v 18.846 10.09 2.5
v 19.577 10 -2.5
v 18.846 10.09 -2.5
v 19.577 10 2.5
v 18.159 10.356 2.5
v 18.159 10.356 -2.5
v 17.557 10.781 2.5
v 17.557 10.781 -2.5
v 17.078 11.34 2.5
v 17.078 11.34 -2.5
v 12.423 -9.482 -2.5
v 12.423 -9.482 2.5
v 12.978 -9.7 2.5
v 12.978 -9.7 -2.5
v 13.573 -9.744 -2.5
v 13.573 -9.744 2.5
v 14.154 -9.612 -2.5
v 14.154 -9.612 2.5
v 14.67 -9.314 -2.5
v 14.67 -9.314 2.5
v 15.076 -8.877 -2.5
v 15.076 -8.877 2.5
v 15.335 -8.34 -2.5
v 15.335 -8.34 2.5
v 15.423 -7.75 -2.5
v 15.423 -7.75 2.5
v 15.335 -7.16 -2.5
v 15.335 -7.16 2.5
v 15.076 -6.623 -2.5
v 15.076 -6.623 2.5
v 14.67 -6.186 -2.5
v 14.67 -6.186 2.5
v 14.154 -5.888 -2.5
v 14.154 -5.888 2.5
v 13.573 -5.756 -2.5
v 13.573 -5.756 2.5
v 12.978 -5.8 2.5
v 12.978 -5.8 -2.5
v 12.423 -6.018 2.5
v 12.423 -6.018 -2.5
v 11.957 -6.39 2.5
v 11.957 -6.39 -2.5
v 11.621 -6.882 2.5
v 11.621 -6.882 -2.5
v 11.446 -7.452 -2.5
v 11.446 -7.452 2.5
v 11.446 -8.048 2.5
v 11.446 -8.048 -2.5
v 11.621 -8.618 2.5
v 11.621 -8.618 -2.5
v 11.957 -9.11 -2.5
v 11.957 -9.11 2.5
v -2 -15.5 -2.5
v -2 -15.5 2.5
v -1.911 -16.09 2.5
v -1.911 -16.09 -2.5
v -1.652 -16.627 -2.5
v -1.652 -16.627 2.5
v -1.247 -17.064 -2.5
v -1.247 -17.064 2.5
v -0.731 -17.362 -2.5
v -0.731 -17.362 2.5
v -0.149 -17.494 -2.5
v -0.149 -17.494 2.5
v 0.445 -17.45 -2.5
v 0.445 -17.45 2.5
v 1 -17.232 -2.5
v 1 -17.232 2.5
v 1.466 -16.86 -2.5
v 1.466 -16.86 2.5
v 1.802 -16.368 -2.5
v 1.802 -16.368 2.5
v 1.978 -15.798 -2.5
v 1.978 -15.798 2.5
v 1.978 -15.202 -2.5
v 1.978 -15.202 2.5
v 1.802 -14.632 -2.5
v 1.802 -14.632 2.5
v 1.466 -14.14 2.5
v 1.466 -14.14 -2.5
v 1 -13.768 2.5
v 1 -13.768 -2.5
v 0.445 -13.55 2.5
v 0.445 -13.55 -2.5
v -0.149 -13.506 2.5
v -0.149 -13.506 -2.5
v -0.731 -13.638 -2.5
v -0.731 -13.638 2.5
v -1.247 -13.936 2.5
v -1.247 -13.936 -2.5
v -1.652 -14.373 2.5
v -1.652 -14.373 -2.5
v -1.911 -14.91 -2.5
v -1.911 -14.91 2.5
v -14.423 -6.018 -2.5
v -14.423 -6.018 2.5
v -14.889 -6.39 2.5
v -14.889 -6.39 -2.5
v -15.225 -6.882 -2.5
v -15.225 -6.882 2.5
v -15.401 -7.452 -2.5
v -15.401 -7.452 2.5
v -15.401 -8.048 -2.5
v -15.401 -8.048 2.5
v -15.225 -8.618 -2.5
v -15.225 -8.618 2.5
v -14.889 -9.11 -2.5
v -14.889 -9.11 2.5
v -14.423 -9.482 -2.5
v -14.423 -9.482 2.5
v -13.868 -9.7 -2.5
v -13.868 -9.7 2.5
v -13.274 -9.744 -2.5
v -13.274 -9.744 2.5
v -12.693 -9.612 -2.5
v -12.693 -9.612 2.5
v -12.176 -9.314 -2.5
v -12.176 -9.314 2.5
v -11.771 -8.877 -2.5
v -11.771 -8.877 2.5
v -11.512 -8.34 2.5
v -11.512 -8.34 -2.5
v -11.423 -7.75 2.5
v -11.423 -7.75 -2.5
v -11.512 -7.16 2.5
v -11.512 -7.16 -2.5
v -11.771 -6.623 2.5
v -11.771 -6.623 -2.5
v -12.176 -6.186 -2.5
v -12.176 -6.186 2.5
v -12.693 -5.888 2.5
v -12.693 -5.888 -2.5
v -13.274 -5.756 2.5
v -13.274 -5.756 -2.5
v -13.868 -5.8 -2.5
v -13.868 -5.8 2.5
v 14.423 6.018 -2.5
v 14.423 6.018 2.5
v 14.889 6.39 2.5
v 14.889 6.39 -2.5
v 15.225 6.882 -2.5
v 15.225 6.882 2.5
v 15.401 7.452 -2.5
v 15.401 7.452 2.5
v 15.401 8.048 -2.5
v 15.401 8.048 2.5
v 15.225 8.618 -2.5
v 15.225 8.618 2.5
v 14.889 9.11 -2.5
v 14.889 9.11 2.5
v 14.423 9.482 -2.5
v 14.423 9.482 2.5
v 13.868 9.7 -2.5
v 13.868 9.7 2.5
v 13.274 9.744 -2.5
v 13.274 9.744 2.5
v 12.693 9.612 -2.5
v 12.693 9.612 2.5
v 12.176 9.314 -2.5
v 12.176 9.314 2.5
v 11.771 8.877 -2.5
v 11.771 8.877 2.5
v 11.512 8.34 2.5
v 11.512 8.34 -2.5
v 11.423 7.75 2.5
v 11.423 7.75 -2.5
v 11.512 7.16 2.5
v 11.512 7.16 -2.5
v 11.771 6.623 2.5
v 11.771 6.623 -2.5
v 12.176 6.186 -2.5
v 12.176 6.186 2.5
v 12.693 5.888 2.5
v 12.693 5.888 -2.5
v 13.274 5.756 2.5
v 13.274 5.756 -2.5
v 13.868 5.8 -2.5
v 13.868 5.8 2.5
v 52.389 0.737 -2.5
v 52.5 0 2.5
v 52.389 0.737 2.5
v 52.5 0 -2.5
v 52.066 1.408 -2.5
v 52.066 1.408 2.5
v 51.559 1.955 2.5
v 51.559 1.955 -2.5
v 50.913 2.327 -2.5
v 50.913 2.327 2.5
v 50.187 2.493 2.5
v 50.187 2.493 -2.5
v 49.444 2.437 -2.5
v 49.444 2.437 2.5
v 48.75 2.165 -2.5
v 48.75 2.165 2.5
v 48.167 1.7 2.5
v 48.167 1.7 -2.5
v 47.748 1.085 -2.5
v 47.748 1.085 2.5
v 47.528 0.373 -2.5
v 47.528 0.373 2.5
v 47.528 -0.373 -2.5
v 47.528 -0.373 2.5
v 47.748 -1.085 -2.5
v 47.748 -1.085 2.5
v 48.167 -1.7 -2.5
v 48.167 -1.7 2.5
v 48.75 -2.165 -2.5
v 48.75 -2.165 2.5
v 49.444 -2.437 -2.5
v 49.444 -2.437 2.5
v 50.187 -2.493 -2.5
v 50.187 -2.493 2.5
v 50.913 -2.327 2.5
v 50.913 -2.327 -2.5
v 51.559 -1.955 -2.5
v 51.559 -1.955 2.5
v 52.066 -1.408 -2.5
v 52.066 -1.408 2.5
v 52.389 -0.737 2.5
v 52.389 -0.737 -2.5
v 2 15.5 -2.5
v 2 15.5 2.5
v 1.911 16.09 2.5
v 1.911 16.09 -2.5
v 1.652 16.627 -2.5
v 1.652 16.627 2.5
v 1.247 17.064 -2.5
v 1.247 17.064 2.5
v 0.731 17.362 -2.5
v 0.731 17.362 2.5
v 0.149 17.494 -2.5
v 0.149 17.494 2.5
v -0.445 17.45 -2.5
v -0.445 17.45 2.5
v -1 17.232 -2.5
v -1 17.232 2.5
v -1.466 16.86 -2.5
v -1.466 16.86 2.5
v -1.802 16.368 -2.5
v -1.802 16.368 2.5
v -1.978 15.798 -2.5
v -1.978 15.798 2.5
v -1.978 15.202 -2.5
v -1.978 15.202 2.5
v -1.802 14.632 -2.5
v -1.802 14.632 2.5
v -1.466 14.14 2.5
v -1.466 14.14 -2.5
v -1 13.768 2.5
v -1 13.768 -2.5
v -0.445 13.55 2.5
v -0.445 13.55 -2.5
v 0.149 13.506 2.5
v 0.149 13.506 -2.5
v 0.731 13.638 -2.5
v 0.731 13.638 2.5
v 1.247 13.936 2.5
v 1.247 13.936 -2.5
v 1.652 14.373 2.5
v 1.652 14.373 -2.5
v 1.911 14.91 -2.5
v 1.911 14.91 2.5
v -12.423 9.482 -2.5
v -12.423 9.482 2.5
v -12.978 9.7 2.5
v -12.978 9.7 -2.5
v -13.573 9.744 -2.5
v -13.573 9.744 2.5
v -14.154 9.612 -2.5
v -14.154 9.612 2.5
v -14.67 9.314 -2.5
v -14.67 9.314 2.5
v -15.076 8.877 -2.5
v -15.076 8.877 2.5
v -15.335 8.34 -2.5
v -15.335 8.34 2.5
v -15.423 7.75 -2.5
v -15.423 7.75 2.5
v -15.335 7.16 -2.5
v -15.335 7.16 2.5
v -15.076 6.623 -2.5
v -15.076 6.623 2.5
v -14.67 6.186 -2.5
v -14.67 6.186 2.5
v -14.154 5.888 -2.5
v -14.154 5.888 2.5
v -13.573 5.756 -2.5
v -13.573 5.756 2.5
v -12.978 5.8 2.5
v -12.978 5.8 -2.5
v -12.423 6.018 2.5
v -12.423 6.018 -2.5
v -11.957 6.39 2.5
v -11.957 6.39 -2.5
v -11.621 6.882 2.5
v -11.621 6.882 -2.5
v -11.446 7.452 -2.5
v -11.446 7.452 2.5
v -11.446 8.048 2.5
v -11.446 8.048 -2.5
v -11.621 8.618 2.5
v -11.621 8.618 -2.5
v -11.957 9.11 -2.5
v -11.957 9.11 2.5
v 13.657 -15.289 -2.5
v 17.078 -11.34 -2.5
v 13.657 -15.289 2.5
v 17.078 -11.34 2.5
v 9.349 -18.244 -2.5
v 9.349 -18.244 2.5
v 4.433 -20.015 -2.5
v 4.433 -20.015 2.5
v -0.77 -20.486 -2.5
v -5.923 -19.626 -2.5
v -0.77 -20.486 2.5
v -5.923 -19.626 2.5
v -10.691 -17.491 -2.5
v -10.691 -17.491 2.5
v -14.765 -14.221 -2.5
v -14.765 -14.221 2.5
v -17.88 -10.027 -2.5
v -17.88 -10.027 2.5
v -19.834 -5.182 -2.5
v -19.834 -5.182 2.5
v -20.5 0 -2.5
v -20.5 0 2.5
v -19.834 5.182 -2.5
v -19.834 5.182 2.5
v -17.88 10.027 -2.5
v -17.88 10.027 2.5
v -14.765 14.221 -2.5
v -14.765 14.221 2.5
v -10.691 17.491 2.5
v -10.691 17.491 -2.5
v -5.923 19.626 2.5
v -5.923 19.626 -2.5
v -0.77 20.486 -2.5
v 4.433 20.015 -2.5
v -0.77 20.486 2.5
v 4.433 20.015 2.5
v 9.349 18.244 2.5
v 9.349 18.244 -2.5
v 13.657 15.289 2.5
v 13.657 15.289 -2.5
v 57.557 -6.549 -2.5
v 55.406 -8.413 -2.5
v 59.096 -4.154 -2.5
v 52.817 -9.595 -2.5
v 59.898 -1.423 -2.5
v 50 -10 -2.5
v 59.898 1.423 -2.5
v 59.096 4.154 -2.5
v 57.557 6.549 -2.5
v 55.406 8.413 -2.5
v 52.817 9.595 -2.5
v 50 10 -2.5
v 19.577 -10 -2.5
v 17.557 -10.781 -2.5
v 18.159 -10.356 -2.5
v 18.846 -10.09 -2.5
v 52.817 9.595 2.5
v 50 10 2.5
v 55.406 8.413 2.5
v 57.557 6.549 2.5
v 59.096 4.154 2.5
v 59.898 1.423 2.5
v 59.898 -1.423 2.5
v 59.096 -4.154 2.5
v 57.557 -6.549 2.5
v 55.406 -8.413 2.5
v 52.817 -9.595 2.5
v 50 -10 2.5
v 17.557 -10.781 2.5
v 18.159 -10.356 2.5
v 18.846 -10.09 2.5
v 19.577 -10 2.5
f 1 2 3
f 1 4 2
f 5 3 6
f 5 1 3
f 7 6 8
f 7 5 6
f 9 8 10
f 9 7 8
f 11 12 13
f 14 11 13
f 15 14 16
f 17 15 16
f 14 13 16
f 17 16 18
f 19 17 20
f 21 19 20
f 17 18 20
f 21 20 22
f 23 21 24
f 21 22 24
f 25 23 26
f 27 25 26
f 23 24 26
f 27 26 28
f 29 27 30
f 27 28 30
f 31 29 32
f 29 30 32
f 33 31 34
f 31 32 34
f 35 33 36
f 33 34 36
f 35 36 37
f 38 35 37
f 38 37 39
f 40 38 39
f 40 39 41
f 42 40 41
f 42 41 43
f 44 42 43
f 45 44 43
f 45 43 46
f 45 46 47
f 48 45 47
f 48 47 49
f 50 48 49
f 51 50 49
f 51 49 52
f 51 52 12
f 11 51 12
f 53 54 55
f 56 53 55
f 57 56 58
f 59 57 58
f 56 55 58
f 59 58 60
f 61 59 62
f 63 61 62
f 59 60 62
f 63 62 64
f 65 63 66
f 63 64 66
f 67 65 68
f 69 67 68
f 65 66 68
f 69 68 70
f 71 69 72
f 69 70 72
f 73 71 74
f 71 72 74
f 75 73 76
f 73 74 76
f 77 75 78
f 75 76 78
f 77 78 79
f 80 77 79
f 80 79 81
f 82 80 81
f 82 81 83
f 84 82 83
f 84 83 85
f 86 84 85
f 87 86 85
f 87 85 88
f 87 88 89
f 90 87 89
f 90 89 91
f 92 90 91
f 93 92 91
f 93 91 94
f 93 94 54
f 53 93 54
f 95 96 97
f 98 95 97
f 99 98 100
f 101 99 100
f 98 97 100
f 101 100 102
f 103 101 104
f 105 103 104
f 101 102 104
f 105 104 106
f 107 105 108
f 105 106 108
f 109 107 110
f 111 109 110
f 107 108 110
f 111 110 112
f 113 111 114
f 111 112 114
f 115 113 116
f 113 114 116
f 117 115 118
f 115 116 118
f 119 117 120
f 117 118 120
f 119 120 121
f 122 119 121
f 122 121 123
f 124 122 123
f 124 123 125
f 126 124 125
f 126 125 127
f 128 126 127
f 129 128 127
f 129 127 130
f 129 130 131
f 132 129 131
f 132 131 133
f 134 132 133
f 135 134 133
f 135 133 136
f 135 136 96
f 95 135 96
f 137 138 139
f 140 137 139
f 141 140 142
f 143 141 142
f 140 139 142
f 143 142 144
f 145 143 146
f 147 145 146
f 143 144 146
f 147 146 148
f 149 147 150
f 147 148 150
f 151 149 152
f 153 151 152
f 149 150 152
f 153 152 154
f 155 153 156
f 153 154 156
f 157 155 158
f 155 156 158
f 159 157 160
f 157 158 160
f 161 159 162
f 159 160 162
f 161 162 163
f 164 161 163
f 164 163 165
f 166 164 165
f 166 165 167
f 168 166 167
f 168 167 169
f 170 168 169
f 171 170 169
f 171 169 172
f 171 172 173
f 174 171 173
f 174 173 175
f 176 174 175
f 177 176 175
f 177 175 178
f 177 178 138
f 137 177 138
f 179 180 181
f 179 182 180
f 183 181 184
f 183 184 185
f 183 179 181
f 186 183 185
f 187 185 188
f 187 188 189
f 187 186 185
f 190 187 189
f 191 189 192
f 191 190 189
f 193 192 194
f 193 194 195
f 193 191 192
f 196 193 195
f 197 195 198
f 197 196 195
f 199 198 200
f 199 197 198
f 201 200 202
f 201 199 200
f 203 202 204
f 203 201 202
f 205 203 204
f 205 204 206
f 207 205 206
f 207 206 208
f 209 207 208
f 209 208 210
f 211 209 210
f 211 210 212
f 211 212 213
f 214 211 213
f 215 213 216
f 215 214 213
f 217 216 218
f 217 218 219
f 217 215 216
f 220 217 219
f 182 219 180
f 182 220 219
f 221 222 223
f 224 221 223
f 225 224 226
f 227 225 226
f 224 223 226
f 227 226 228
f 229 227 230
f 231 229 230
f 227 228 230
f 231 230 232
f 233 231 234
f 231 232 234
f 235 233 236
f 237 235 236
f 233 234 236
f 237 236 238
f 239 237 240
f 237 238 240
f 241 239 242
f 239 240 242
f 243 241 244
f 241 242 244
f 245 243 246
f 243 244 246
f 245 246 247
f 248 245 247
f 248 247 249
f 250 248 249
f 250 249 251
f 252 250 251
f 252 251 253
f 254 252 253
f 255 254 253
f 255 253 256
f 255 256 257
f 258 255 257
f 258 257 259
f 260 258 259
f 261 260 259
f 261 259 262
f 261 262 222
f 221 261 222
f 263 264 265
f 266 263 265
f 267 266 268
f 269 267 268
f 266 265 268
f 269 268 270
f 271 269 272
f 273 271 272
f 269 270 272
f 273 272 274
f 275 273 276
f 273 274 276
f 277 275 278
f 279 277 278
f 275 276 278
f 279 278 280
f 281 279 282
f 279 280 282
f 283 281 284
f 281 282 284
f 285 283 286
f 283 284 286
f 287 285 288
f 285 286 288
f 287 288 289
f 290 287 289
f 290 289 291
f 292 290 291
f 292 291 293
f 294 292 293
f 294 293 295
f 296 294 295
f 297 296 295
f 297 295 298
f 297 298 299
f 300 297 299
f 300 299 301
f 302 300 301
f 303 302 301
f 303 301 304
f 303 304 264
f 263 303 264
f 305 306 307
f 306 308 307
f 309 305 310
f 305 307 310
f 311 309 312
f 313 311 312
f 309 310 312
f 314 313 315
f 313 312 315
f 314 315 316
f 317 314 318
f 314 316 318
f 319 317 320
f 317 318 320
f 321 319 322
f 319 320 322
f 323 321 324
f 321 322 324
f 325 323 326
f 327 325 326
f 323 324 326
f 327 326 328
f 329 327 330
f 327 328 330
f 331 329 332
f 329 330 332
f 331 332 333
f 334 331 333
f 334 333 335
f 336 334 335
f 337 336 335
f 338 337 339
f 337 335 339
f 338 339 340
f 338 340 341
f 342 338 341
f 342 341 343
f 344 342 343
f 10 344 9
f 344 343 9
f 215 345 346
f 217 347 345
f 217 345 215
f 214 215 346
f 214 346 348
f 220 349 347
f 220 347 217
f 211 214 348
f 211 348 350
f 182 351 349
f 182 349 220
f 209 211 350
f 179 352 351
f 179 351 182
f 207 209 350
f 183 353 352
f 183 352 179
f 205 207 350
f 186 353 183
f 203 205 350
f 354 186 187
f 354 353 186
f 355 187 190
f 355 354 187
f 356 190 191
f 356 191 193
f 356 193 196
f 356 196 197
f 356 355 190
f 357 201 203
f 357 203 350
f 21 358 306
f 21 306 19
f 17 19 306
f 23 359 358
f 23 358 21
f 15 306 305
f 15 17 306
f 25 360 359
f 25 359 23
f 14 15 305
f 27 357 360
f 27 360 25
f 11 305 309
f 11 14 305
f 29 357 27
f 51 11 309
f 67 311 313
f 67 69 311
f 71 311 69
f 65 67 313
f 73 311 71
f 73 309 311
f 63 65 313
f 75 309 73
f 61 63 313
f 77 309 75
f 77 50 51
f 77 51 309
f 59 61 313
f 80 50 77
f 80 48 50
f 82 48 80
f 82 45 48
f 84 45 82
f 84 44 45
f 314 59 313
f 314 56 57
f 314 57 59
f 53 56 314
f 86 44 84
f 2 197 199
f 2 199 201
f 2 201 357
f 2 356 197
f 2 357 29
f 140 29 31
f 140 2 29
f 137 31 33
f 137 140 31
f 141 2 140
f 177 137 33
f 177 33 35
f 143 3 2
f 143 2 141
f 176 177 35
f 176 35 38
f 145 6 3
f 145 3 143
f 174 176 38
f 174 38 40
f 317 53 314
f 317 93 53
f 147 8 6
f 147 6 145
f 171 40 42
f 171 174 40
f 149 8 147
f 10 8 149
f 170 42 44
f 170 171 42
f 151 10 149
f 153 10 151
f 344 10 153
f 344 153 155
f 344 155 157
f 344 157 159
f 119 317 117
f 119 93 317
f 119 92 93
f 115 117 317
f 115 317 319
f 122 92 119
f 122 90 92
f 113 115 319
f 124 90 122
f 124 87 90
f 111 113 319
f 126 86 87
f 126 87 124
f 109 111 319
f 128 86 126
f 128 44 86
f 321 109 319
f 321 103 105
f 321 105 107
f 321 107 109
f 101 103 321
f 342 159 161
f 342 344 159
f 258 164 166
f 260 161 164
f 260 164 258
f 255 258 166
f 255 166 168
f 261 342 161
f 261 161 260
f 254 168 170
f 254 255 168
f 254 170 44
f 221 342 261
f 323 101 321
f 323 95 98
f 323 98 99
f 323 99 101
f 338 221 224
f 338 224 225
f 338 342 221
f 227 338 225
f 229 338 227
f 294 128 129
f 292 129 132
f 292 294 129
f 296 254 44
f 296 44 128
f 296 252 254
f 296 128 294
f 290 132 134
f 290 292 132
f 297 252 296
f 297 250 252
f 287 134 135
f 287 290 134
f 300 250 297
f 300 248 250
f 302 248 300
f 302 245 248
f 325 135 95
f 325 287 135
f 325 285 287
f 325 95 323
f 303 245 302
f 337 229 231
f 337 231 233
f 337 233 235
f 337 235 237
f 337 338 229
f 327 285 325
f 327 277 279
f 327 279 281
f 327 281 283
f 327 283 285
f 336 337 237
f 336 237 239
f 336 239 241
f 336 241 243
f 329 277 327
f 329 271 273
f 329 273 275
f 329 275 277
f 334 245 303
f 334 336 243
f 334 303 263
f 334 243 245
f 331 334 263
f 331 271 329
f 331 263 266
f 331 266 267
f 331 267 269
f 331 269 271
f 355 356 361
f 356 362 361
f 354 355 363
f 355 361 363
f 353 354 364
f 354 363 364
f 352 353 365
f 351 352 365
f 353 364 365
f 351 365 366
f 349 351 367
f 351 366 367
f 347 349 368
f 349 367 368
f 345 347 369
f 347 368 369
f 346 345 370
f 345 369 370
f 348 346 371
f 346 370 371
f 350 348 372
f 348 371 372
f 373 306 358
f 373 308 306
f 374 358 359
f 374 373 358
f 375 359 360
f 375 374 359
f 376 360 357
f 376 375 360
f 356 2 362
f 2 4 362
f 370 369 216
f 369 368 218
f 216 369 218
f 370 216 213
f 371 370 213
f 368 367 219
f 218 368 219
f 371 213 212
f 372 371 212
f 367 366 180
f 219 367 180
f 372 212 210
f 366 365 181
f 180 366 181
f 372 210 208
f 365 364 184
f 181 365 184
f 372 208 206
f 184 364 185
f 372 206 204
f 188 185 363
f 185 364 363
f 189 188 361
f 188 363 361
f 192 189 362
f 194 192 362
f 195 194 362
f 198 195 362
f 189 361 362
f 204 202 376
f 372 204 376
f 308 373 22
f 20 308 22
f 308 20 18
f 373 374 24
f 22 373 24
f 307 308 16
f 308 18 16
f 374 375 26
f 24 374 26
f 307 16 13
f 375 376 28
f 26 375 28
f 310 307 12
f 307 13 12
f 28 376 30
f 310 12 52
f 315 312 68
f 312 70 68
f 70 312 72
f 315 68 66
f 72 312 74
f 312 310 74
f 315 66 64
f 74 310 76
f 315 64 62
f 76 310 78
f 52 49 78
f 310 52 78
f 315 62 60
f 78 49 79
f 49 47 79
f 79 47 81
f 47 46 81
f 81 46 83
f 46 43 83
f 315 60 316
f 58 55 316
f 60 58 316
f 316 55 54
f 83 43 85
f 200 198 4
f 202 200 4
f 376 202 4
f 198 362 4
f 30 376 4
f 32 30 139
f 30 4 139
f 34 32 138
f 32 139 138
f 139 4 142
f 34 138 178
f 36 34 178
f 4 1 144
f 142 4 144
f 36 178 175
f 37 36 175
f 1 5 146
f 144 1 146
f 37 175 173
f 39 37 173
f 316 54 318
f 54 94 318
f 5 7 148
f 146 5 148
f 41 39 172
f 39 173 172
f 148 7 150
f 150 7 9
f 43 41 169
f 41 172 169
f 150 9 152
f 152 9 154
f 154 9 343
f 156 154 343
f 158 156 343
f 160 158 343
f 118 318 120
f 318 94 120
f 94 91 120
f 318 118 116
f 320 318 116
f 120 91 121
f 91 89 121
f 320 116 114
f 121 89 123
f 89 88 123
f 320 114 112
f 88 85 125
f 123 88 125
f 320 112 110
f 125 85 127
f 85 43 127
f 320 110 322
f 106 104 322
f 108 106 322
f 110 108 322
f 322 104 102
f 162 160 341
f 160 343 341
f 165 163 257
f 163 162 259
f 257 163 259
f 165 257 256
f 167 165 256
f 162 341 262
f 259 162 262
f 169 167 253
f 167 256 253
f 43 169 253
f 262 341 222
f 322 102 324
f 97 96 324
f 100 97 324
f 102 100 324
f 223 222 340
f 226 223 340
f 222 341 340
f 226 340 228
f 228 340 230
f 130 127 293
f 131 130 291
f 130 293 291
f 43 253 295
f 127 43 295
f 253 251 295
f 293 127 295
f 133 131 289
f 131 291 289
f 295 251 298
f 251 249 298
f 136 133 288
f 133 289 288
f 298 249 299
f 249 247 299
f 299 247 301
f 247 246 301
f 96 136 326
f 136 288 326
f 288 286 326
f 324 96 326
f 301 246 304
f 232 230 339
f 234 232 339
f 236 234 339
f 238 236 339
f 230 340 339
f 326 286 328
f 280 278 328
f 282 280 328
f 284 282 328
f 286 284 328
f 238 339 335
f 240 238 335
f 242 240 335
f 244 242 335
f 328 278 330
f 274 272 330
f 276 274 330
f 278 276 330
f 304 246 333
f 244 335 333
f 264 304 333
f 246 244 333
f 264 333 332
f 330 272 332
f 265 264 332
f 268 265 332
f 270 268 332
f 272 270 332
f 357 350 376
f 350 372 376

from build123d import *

# Parameters (mm, degrees)
SKETCH_1_R               = 2.5
EXTRUDE_1_DEPTH          = 2.5
CUT_EXTRUDE_1_REACH      = 65.602
SKETCH_2_R               = 2
PATTERN_CIRCULAR_1_COUNT = 6
FILLET_1_R               = 3


with BuildPart() as part:
    # 草圖1 → 填料-伸長1 (new, symmetric)
    with BuildSketch(Plane.XY):
        with BuildLine():
            Line((17.895530168, 10), (50, 10))
            ThreePointArc((50, 10), (60, 0), (50, -10))
            Line((50, -10), (17.895530168, -10))
            ThreePointArc((17.895530168, -10), (-20.5, 0), (17.895530168, 10))
        make_face()
        with Locations((50, 0)):
            Circle(SKETCH_1_R, mode=Mode.SUBTRACT)
    extrude(amount=EXTRUDE_1_DEPTH, both=True)

    # 草圖2 → 除料-伸長1 (cut, up to next)
    with BuildSketch(Plane.XY.offset(2.5), mode=Mode.PRIVATE) as cut_extrude_1_sk1:
        with Locations((0, 15.5)):
            Circle(SKETCH_2_R)
    cut_extrude_1_tool1 = extrude(cut_extrude_1_sk1.sketch, amount=-CUT_EXTRUDE_1_REACH, mode=Mode.PRIVATE) & part.part
    cut_extrude_1 = cut_extrude_1_tool1.solids().sort_by_distance((0, 15.5, 2.5))[0]
    add(cut_extrude_1, mode=Mode.SUBTRACT)

    # 環狀複製排列1: 除料-伸長1 ×6 about axis
    pattern_circular_1_axis = Axis((0, 0, 0), (0, 0, 1))
    for i in range(1, PATTERN_CIRCULAR_1_COUNT):
        add(cut_extrude_1.rotate(pattern_circular_1_axis, i * 360 / PATTERN_CIRCULAR_1_COUNT), mode=Mode.SUBTRACT)

    # 圓角1
    fillet_1_edges = [part.edges().sort_by_distance(p)[0] for p in [
        (17.895530168, 10, 0),
        (17.895530168, -10, 0),
    ]]
    fillet(fillet_1_edges, radius=FILLET_1_R)


solid = part.part
